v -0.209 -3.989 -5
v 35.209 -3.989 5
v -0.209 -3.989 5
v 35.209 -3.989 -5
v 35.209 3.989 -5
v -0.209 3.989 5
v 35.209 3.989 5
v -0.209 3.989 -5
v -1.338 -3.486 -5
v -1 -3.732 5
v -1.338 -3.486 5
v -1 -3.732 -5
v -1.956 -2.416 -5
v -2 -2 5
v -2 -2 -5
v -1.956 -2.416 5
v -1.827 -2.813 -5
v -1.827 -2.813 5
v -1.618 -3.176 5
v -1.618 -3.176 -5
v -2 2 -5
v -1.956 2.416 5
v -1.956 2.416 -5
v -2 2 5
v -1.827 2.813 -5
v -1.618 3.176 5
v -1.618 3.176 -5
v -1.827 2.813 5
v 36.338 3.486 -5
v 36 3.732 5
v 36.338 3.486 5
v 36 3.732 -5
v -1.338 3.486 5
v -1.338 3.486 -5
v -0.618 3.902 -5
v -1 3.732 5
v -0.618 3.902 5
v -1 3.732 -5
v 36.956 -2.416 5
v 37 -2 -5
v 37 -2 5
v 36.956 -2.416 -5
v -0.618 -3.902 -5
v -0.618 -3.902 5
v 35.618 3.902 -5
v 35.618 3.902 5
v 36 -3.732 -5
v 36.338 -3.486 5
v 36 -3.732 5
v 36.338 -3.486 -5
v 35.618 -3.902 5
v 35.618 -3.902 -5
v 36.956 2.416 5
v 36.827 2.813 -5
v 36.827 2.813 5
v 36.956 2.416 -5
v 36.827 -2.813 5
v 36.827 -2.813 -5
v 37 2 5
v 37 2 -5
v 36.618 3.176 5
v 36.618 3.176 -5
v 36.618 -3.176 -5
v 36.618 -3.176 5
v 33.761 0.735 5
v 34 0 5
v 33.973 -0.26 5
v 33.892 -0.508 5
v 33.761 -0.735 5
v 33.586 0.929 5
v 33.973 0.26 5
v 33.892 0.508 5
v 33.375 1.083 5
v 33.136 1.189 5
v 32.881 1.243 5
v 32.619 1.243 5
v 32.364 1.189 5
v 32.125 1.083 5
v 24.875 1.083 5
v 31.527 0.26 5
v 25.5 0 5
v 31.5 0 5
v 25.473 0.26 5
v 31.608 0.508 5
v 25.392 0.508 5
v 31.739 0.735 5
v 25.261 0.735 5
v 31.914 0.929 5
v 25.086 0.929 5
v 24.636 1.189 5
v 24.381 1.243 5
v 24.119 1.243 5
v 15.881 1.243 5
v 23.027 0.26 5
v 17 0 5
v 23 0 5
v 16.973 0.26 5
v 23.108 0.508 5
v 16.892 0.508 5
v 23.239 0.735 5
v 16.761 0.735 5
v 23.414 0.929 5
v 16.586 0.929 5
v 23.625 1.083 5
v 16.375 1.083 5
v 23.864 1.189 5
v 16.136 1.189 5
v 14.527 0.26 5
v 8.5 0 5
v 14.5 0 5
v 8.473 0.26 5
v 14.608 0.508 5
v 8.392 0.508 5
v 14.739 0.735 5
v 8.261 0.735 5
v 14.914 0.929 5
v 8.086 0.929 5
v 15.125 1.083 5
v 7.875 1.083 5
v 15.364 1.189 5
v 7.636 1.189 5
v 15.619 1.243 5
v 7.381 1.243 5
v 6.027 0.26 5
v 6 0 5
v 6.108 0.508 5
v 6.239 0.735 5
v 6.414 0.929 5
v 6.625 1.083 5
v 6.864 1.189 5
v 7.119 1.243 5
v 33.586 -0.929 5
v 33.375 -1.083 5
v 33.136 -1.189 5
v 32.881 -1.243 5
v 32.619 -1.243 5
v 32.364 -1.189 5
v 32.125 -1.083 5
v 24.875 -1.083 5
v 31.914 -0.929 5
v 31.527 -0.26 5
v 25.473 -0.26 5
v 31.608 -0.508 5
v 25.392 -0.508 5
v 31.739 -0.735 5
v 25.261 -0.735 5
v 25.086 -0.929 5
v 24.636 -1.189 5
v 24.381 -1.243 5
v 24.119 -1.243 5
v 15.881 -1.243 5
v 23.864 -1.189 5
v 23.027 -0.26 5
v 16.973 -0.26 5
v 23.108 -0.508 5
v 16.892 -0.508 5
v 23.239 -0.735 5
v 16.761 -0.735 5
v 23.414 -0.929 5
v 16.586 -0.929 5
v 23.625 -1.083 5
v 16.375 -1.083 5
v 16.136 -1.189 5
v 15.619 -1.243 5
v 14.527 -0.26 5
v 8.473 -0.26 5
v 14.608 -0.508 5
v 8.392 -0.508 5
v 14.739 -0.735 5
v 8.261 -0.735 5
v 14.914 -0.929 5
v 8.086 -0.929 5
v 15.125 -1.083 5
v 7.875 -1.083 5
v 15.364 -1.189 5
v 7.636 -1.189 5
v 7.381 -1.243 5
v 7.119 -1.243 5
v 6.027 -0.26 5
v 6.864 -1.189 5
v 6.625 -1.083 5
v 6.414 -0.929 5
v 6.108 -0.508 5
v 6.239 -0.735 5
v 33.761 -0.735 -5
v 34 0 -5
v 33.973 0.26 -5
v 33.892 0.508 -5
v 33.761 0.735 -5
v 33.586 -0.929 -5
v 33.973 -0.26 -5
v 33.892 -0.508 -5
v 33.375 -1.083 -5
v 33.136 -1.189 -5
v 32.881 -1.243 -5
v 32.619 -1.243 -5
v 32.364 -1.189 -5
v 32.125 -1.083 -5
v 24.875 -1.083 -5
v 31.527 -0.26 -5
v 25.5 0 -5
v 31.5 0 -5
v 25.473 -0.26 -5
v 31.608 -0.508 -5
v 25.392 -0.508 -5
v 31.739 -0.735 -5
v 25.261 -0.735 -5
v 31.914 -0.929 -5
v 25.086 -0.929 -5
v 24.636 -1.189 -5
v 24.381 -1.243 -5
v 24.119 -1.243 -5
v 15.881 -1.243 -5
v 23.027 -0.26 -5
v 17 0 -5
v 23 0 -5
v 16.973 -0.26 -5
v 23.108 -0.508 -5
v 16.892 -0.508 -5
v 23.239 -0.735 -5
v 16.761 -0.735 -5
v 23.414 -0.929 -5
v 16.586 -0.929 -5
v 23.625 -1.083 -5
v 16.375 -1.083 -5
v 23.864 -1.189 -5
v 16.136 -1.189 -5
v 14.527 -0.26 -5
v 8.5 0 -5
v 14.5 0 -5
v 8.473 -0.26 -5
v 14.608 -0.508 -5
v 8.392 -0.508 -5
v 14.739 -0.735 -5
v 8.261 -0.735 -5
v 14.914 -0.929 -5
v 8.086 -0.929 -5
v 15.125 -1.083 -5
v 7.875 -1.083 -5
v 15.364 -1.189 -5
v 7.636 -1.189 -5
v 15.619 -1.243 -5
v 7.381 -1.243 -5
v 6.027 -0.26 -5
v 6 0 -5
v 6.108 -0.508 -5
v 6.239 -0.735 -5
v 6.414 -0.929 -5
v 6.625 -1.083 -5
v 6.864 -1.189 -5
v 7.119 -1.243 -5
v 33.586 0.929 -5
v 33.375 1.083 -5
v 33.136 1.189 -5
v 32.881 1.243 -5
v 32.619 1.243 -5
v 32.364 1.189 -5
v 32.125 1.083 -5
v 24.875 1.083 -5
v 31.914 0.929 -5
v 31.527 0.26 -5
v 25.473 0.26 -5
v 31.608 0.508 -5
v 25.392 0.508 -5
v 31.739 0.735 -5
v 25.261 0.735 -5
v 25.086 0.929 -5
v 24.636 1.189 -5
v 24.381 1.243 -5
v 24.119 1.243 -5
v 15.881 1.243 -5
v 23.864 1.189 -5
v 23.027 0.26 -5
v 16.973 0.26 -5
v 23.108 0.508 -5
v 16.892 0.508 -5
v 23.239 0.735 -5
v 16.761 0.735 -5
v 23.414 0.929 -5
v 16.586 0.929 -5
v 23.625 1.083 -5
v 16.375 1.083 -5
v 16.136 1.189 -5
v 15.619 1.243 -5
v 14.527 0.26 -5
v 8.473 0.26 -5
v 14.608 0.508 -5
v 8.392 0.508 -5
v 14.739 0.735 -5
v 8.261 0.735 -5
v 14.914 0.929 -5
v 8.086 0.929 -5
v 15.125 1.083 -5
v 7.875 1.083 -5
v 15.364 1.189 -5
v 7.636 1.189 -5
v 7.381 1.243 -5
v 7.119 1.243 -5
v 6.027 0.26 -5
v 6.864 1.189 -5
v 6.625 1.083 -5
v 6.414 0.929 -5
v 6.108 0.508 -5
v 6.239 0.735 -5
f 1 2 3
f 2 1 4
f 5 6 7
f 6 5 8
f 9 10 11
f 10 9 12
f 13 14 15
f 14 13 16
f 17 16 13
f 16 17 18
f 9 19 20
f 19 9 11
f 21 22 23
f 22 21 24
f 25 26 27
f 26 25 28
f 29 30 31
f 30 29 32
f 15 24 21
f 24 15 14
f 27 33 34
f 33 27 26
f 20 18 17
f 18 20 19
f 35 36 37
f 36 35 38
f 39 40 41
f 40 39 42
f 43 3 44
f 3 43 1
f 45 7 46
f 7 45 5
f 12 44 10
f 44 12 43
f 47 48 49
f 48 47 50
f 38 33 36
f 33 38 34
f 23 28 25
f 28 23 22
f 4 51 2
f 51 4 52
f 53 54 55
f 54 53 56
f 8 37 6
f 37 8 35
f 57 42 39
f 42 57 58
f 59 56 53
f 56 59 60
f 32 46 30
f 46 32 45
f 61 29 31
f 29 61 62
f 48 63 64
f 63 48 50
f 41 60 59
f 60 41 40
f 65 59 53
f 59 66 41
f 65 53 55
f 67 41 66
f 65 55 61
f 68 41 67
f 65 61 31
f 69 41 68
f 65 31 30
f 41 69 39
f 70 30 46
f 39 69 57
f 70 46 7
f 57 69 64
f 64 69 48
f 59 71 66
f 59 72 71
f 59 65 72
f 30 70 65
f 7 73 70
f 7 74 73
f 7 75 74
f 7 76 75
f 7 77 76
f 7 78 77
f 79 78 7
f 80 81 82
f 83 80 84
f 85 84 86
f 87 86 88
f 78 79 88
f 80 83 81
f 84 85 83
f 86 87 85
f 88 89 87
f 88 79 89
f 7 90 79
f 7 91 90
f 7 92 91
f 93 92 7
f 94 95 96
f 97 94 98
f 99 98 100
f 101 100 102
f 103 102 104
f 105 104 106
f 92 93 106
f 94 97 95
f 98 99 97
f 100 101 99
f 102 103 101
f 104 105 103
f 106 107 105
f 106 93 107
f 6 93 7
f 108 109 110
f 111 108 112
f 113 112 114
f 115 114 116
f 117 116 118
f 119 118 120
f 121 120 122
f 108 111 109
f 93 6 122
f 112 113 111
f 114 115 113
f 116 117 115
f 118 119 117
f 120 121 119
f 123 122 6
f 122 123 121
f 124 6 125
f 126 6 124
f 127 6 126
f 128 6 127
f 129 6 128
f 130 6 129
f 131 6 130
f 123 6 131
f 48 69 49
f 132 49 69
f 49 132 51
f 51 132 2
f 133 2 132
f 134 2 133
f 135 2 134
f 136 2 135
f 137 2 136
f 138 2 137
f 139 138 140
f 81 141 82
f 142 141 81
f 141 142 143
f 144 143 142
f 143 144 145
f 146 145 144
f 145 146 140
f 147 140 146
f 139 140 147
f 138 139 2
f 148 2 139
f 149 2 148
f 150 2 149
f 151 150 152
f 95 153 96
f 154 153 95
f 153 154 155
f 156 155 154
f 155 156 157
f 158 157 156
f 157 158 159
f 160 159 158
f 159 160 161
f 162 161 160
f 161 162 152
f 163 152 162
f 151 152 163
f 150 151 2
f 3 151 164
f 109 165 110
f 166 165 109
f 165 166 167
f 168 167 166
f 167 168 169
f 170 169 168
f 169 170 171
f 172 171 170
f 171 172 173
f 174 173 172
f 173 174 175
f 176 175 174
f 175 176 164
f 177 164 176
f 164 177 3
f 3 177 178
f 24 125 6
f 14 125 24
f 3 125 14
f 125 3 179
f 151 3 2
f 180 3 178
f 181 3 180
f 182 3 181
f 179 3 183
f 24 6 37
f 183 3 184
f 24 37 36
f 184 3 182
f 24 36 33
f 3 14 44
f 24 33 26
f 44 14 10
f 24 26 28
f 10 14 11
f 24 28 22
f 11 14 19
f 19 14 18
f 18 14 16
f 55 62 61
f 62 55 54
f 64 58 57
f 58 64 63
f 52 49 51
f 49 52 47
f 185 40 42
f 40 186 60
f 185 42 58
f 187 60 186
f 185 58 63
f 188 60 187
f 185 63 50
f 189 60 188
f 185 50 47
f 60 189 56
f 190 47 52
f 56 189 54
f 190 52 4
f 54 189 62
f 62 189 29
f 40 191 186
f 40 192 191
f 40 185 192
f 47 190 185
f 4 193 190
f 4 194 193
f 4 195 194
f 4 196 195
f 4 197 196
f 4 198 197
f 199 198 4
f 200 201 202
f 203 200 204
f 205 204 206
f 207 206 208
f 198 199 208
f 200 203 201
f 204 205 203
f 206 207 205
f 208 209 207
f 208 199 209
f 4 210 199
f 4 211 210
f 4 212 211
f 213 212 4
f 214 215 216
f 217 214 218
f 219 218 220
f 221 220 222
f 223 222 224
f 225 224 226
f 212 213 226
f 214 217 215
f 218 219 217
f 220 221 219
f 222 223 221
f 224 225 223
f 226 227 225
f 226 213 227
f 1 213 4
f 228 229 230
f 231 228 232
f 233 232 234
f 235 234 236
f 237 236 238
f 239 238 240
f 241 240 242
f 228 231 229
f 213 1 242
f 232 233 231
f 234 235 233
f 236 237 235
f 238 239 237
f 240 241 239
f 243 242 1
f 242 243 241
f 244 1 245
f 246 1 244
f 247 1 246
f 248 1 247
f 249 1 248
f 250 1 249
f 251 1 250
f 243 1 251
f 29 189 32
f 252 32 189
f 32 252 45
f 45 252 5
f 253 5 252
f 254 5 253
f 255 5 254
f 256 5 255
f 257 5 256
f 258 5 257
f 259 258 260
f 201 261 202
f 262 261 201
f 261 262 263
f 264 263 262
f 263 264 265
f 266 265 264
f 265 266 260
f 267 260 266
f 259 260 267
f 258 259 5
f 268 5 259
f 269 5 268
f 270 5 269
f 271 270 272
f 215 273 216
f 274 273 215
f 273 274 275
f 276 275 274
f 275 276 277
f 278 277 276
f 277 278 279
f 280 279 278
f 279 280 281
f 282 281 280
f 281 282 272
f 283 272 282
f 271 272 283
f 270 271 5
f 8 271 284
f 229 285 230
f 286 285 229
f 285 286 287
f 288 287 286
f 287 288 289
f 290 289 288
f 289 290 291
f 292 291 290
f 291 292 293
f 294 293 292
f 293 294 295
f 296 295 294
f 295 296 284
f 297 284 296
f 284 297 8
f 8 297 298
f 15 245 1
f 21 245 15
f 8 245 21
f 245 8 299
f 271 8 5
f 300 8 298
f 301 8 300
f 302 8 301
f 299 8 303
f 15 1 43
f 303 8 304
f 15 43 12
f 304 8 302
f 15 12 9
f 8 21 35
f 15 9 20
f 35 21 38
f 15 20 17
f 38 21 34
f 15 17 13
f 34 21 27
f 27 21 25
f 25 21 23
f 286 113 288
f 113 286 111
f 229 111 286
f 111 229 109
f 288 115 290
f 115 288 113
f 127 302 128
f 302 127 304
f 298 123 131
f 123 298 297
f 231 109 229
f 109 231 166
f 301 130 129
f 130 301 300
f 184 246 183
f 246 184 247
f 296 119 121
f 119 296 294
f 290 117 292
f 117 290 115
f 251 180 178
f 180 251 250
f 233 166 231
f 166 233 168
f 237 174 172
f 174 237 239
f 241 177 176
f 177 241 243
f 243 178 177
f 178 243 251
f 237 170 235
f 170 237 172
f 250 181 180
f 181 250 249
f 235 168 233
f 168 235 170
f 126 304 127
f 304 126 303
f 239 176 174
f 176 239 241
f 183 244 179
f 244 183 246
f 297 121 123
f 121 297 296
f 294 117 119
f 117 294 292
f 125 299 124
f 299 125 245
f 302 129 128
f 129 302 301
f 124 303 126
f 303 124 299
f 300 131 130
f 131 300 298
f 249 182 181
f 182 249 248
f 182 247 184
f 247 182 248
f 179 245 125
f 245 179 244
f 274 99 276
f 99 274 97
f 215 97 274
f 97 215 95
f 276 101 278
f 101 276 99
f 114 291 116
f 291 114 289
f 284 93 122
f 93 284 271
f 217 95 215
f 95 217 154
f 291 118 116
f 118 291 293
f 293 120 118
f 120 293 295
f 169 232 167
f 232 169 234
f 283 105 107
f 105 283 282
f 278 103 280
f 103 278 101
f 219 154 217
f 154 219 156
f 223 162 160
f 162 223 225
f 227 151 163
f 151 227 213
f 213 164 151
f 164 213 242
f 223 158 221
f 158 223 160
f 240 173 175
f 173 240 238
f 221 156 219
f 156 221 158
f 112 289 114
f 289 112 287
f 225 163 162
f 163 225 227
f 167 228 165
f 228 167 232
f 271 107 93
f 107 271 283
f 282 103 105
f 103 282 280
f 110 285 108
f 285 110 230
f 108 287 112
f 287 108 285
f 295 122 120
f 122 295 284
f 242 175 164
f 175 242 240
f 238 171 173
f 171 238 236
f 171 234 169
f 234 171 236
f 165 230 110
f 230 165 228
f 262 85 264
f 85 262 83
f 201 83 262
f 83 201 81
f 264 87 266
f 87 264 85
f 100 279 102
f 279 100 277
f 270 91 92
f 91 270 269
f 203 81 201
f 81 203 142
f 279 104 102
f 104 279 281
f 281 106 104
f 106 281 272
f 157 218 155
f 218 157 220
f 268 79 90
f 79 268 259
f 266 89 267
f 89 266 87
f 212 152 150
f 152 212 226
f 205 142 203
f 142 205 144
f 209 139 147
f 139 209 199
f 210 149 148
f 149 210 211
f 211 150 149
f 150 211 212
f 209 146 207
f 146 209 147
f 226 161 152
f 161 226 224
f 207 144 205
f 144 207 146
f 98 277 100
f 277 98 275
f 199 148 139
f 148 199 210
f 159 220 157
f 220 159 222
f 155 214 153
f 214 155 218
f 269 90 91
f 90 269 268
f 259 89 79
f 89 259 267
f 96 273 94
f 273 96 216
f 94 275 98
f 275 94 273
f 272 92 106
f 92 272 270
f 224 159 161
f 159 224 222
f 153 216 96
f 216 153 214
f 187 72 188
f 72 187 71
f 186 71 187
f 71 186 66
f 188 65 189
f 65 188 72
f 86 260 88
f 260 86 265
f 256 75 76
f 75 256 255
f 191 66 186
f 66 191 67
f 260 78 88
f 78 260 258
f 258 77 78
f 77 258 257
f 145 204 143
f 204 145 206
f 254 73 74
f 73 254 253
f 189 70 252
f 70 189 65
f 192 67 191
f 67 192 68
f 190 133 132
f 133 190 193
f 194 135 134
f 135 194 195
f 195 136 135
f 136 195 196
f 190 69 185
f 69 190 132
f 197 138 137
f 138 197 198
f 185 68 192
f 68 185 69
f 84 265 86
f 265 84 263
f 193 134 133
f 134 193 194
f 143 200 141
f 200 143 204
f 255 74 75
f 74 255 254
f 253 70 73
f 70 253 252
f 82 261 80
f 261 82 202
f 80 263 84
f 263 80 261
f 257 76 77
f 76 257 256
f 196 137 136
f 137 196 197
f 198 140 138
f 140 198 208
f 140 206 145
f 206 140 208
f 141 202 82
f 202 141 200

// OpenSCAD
$fn=30;
height=10;
radius=2;
difference(){
    hull(){
        translate([0,-2,0])cylinder(r=radius,h=height, center=true);
        translate([35,2,0])cylinder(r=radius,h=height, center=true);
        translate([0,2,0])cylinder(r=radius,h=height, center=true);
        translate([35,-2,0])cylinder(r=radius,h=height, center=true);
  }
    translate([7.25,0,0])cylinder(d=radius/0.8,h=height*10, center=true);
    translate([15.75,0,0])cylinder(d=radius/0.8,h=height*10, center=true);
    translate([24.25,0,0])cylinder(d=radius/0.8,h=height*10, center=true);
    translate([32.75,0,0])cylinder(d=radius/0.8,h=height*10, center=true);
}
